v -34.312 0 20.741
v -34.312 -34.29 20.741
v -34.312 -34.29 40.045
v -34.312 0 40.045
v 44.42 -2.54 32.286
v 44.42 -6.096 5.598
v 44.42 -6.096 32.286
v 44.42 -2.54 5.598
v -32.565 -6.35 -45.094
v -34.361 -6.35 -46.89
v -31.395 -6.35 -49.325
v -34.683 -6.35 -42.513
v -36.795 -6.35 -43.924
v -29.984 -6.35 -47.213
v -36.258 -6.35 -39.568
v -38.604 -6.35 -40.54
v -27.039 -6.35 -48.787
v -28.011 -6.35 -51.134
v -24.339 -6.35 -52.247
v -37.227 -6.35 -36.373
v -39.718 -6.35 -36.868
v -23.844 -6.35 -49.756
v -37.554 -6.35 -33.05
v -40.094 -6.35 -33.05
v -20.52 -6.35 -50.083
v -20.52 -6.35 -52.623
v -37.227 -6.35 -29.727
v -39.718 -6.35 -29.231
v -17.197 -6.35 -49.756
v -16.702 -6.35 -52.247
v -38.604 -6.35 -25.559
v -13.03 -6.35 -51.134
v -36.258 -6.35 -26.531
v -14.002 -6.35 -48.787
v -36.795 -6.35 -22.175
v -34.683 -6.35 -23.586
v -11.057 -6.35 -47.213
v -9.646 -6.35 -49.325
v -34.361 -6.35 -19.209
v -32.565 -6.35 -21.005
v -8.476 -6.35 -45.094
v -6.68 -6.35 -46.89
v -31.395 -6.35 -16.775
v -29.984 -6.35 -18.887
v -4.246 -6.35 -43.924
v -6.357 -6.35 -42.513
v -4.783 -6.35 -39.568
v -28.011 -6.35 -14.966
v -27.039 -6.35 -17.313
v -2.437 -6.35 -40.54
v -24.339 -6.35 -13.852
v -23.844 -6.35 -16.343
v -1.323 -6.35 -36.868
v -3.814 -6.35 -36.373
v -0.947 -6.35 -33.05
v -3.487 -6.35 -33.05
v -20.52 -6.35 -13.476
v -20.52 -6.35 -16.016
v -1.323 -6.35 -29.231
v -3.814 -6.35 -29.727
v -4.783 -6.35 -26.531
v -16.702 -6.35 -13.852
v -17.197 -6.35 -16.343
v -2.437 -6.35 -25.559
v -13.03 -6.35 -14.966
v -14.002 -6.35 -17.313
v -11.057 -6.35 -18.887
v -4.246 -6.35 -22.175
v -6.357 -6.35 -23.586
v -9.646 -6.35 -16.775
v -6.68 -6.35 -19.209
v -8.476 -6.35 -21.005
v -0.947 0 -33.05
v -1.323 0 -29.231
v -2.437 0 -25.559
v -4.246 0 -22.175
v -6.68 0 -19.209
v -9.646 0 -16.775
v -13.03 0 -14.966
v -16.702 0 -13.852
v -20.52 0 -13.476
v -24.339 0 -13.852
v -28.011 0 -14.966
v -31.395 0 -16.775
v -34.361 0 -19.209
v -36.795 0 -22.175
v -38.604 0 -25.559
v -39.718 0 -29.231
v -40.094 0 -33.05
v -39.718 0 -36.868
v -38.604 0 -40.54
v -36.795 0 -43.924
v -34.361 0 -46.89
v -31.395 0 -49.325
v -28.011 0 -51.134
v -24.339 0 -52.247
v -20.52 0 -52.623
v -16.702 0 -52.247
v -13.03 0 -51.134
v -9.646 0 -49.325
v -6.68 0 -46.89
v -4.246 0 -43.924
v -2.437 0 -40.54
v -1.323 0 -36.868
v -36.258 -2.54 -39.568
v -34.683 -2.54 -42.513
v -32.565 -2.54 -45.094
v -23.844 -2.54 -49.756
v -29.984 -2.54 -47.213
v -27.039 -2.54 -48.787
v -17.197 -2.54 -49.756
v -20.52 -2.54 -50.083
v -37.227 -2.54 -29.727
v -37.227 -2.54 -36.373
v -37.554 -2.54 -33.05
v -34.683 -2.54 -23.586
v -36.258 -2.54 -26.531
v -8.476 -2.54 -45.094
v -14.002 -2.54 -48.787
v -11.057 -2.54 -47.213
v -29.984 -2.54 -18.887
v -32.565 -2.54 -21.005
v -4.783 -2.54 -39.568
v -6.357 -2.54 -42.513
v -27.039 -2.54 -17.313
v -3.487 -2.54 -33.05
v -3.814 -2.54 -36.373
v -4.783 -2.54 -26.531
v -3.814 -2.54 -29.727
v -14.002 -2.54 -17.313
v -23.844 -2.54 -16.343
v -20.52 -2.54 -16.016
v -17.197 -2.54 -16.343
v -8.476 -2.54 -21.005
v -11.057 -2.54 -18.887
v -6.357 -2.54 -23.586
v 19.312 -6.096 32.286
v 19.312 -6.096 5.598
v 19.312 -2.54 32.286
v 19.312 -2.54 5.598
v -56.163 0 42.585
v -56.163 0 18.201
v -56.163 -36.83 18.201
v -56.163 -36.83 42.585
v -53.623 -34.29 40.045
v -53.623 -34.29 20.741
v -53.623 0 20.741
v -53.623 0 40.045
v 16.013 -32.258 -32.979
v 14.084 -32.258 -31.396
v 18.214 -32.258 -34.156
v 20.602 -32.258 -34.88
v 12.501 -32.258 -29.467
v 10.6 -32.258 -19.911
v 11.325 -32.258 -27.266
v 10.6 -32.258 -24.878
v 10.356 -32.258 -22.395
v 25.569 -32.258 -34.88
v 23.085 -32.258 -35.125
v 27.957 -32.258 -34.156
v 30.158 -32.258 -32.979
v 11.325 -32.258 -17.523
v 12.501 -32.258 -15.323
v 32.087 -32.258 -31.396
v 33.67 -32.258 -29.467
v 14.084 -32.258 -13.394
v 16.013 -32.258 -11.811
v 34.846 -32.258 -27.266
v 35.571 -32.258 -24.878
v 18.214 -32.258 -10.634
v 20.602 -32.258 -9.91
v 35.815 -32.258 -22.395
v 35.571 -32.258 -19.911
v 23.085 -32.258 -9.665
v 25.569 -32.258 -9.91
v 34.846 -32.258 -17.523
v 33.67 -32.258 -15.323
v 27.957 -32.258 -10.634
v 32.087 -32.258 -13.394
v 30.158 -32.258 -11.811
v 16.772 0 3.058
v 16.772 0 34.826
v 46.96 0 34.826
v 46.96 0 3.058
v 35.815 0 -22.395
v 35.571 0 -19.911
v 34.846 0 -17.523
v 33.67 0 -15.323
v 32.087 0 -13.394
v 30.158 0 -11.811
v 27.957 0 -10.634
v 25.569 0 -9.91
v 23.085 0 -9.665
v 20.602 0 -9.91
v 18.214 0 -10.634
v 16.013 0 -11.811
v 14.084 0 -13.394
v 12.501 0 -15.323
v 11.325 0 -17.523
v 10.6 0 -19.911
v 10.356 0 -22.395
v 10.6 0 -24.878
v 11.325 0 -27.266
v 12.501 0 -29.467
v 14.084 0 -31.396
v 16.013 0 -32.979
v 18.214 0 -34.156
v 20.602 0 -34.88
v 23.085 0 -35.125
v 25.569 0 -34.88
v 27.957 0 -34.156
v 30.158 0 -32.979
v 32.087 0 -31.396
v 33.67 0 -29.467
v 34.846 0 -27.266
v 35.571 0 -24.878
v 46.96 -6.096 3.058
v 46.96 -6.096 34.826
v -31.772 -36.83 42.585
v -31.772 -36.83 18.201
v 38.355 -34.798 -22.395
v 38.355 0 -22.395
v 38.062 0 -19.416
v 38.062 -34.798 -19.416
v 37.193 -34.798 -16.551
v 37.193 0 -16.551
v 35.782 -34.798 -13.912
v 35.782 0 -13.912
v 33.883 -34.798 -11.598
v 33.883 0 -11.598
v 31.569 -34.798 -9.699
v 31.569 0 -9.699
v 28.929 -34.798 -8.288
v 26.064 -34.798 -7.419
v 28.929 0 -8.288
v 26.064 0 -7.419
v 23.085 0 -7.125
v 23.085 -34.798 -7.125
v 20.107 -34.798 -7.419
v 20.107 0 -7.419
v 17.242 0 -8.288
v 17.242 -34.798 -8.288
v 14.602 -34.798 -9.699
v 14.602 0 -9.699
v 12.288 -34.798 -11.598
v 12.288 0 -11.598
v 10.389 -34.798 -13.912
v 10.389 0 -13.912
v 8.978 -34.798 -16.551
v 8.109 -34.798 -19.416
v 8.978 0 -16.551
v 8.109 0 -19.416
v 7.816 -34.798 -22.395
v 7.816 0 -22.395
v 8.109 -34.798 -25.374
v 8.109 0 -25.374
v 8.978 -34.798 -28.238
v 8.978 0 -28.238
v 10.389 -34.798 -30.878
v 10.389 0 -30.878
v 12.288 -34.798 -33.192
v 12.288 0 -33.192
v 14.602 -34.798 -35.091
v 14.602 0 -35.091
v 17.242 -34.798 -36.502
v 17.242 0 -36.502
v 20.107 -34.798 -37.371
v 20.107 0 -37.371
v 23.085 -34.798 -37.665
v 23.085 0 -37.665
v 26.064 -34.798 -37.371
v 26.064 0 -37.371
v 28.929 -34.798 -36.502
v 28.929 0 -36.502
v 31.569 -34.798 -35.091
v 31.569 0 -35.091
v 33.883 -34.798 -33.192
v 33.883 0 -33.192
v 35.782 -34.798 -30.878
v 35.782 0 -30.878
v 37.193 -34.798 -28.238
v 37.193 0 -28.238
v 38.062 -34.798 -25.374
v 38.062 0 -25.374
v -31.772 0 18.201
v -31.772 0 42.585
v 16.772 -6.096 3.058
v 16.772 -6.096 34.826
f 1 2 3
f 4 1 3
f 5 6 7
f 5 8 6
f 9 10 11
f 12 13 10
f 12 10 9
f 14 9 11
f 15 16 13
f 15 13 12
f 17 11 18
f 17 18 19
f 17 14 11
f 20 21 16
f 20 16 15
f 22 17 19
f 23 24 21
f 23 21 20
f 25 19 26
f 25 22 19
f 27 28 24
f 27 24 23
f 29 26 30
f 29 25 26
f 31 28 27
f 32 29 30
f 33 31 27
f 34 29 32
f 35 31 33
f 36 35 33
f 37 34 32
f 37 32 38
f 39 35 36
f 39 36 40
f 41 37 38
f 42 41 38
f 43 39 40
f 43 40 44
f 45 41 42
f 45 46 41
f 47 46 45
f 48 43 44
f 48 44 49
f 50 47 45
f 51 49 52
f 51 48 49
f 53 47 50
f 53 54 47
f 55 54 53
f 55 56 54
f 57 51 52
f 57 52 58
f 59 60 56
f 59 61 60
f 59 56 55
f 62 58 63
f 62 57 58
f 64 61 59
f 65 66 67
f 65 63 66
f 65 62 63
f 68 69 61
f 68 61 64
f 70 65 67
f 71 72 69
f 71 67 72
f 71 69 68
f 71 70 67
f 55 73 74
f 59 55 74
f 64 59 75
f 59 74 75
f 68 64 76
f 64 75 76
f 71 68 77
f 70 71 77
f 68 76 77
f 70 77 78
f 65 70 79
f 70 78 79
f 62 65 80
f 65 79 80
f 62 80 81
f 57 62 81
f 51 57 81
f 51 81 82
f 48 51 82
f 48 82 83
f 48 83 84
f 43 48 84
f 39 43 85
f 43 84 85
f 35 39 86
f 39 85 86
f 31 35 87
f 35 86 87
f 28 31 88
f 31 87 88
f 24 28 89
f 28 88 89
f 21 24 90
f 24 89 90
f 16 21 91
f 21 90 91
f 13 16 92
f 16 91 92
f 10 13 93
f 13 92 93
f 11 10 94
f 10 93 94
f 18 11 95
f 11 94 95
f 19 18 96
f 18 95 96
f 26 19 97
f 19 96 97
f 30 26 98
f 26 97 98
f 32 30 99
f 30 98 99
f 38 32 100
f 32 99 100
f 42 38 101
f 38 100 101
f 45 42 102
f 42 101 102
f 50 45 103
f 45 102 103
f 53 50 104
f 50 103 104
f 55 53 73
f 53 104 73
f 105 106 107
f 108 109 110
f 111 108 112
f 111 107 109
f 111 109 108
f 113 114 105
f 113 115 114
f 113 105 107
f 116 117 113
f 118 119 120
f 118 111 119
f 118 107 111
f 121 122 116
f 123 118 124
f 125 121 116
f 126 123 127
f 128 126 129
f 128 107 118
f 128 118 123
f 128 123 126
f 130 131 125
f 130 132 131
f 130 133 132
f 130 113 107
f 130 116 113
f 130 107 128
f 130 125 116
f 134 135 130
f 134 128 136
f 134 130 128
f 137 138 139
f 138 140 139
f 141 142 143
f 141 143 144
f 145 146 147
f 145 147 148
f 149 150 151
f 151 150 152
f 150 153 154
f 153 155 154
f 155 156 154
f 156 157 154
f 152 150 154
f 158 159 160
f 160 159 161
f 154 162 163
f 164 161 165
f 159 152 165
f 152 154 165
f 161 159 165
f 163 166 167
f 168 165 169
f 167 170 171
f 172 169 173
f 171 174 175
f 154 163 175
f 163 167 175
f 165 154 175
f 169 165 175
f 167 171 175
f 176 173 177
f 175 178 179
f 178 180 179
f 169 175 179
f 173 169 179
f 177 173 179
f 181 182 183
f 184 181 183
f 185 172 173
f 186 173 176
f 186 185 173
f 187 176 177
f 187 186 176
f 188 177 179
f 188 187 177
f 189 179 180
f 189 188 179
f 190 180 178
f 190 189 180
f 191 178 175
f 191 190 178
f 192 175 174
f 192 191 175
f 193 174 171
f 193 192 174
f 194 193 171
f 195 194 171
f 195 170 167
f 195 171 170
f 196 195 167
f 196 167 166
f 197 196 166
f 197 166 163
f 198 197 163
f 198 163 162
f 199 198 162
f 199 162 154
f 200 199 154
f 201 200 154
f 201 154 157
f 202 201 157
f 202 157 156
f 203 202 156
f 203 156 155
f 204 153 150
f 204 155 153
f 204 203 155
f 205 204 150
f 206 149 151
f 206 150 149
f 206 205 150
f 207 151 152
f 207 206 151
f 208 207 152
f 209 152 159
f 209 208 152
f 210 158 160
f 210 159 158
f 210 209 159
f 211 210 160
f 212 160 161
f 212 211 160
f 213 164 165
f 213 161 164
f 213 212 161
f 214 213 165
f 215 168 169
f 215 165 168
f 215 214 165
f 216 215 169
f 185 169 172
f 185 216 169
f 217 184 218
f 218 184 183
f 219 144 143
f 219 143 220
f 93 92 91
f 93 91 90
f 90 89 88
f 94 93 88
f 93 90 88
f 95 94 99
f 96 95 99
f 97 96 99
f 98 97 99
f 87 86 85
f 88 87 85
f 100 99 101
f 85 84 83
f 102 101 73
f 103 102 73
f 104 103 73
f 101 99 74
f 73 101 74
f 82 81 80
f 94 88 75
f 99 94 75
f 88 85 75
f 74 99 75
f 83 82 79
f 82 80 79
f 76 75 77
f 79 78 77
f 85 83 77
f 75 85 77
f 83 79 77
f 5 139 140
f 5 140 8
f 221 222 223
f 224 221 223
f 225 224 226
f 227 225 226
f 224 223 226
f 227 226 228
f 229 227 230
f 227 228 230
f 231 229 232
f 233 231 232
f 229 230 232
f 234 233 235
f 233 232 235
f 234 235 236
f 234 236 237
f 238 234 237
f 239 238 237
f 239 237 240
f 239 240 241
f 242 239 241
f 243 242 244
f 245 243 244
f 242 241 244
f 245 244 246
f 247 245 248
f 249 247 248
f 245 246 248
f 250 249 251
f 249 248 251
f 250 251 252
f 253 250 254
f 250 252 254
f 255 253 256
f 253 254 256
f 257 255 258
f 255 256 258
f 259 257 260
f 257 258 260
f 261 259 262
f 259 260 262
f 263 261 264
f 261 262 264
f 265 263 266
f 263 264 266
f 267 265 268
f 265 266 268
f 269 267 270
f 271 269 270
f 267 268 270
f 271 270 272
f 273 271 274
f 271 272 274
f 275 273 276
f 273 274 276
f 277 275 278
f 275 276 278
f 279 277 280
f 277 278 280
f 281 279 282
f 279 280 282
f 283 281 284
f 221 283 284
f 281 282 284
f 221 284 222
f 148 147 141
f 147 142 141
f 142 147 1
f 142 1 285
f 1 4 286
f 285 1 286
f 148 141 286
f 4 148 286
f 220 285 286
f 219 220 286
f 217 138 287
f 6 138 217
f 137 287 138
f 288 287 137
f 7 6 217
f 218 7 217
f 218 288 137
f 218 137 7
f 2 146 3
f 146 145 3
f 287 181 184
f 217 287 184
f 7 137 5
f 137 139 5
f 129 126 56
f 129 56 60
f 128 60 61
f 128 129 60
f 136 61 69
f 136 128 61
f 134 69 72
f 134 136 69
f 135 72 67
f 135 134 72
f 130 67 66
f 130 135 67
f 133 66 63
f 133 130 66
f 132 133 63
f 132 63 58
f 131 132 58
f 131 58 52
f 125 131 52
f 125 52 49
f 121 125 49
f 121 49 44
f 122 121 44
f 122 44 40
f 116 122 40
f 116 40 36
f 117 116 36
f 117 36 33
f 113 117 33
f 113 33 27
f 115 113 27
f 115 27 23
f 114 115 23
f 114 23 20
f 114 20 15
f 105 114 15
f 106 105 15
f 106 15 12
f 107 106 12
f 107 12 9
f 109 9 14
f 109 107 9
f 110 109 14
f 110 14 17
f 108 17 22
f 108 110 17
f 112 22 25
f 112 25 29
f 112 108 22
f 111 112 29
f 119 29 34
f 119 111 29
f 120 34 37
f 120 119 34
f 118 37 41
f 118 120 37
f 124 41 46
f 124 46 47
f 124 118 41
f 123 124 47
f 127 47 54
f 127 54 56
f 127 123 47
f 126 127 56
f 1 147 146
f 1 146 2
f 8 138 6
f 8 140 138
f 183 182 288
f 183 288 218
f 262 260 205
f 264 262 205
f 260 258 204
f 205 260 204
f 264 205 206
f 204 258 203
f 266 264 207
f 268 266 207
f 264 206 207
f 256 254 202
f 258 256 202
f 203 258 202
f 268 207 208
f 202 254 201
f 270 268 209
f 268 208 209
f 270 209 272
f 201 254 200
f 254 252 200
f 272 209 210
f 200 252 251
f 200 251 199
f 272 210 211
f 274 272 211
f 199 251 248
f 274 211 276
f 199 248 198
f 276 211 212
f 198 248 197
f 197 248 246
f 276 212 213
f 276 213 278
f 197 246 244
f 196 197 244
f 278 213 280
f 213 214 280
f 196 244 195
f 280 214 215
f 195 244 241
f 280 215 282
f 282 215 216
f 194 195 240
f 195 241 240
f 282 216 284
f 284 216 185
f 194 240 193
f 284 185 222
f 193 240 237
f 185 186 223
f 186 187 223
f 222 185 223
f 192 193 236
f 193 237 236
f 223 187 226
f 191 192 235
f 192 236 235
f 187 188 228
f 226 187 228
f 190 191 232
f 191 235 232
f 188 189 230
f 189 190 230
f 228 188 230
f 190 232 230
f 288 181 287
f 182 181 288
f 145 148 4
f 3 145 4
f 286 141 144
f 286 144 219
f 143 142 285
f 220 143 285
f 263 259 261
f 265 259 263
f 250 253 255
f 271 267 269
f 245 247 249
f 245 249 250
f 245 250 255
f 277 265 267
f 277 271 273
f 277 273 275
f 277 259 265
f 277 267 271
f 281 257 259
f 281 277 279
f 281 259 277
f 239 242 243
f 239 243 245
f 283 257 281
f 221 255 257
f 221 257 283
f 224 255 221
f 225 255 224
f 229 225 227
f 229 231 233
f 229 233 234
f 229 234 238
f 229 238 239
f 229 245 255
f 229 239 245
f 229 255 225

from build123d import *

# Parameters (mm, degrees)
F0_W      = 24.390706
F0_H      = 24.384
F1_DEPTH  = 36.83
F2_T      = -2.54
F3_W      = 30.188734
F3_H      = 31.767224
F4_DEPTH  = 6.096
F5_T      = -2.54
F6_R      = 19.573706
F7_DEPTH  = 6.35
F8_T      = -2.54
F9_R      = 15.269704
F10_DEPTH = 34.798
F11_T     = -2.54


with BuildPart() as f1:
    # F0 (on Front) → F1 (new body)
    with BuildSketch(Plane.XZ):
        with Locations((-43.967679, 30.392964)):
            Rectangle(F0_W, F0_H)
    extrude(amount=F1_DEPTH)

    # F2
    f2_openings = [f1.faces().sort_by_distance(p)[0] for p in [
        (-43.967679, 0, 30.392964),
    ]]
    offset(amount=F2_T, openings=f2_openings)


with BuildPart() as f4:
    # F3 (on Front) → F4 (new body)
    with BuildSketch(Plane.XZ):
        with Locations((31.865883, 18.941948)):
            Rectangle(F3_W, F3_H)
    extrude(amount=F4_DEPTH)

    # F5
    f5_openings = [f4.faces().sort_by_distance(p)[0] for p in [
        (31.865883, -6.096, 18.941948),
    ]]
    offset(amount=F5_T, openings=f5_openings)


with BuildPart() as f7:
    # F6 (on Front) → F7 (new body)
    with BuildSketch(Plane.XZ):
        with Locations((-20.520445, -33.049755)):
            Circle(F6_R)
    extrude(amount=F7_DEPTH)

    # F8
    f8_openings = [f7.faces().sort_by_distance(p)[0] for p in [
        (-20.520445, -6.35, -33.049755),
    ]]
    offset(amount=F8_T, openings=f8_openings)


with BuildPart() as f10:
    # F9 (on Front) → F10 (new body)
    with BuildSketch(Plane.XZ):
        with Locations((23.085499, -22.394909)):
            Circle(F9_R)
    extrude(amount=F10_DEPTH)

    # F11
    f11_openings = [f10.faces().sort_by_distance(p)[0] for p in [
        (23.085499, 0, -22.394909),
    ]]
    offset(amount=F11_T, openings=f11_openings)


solid = Compound([f1.part, f4.part, f7.part, f10.part])
